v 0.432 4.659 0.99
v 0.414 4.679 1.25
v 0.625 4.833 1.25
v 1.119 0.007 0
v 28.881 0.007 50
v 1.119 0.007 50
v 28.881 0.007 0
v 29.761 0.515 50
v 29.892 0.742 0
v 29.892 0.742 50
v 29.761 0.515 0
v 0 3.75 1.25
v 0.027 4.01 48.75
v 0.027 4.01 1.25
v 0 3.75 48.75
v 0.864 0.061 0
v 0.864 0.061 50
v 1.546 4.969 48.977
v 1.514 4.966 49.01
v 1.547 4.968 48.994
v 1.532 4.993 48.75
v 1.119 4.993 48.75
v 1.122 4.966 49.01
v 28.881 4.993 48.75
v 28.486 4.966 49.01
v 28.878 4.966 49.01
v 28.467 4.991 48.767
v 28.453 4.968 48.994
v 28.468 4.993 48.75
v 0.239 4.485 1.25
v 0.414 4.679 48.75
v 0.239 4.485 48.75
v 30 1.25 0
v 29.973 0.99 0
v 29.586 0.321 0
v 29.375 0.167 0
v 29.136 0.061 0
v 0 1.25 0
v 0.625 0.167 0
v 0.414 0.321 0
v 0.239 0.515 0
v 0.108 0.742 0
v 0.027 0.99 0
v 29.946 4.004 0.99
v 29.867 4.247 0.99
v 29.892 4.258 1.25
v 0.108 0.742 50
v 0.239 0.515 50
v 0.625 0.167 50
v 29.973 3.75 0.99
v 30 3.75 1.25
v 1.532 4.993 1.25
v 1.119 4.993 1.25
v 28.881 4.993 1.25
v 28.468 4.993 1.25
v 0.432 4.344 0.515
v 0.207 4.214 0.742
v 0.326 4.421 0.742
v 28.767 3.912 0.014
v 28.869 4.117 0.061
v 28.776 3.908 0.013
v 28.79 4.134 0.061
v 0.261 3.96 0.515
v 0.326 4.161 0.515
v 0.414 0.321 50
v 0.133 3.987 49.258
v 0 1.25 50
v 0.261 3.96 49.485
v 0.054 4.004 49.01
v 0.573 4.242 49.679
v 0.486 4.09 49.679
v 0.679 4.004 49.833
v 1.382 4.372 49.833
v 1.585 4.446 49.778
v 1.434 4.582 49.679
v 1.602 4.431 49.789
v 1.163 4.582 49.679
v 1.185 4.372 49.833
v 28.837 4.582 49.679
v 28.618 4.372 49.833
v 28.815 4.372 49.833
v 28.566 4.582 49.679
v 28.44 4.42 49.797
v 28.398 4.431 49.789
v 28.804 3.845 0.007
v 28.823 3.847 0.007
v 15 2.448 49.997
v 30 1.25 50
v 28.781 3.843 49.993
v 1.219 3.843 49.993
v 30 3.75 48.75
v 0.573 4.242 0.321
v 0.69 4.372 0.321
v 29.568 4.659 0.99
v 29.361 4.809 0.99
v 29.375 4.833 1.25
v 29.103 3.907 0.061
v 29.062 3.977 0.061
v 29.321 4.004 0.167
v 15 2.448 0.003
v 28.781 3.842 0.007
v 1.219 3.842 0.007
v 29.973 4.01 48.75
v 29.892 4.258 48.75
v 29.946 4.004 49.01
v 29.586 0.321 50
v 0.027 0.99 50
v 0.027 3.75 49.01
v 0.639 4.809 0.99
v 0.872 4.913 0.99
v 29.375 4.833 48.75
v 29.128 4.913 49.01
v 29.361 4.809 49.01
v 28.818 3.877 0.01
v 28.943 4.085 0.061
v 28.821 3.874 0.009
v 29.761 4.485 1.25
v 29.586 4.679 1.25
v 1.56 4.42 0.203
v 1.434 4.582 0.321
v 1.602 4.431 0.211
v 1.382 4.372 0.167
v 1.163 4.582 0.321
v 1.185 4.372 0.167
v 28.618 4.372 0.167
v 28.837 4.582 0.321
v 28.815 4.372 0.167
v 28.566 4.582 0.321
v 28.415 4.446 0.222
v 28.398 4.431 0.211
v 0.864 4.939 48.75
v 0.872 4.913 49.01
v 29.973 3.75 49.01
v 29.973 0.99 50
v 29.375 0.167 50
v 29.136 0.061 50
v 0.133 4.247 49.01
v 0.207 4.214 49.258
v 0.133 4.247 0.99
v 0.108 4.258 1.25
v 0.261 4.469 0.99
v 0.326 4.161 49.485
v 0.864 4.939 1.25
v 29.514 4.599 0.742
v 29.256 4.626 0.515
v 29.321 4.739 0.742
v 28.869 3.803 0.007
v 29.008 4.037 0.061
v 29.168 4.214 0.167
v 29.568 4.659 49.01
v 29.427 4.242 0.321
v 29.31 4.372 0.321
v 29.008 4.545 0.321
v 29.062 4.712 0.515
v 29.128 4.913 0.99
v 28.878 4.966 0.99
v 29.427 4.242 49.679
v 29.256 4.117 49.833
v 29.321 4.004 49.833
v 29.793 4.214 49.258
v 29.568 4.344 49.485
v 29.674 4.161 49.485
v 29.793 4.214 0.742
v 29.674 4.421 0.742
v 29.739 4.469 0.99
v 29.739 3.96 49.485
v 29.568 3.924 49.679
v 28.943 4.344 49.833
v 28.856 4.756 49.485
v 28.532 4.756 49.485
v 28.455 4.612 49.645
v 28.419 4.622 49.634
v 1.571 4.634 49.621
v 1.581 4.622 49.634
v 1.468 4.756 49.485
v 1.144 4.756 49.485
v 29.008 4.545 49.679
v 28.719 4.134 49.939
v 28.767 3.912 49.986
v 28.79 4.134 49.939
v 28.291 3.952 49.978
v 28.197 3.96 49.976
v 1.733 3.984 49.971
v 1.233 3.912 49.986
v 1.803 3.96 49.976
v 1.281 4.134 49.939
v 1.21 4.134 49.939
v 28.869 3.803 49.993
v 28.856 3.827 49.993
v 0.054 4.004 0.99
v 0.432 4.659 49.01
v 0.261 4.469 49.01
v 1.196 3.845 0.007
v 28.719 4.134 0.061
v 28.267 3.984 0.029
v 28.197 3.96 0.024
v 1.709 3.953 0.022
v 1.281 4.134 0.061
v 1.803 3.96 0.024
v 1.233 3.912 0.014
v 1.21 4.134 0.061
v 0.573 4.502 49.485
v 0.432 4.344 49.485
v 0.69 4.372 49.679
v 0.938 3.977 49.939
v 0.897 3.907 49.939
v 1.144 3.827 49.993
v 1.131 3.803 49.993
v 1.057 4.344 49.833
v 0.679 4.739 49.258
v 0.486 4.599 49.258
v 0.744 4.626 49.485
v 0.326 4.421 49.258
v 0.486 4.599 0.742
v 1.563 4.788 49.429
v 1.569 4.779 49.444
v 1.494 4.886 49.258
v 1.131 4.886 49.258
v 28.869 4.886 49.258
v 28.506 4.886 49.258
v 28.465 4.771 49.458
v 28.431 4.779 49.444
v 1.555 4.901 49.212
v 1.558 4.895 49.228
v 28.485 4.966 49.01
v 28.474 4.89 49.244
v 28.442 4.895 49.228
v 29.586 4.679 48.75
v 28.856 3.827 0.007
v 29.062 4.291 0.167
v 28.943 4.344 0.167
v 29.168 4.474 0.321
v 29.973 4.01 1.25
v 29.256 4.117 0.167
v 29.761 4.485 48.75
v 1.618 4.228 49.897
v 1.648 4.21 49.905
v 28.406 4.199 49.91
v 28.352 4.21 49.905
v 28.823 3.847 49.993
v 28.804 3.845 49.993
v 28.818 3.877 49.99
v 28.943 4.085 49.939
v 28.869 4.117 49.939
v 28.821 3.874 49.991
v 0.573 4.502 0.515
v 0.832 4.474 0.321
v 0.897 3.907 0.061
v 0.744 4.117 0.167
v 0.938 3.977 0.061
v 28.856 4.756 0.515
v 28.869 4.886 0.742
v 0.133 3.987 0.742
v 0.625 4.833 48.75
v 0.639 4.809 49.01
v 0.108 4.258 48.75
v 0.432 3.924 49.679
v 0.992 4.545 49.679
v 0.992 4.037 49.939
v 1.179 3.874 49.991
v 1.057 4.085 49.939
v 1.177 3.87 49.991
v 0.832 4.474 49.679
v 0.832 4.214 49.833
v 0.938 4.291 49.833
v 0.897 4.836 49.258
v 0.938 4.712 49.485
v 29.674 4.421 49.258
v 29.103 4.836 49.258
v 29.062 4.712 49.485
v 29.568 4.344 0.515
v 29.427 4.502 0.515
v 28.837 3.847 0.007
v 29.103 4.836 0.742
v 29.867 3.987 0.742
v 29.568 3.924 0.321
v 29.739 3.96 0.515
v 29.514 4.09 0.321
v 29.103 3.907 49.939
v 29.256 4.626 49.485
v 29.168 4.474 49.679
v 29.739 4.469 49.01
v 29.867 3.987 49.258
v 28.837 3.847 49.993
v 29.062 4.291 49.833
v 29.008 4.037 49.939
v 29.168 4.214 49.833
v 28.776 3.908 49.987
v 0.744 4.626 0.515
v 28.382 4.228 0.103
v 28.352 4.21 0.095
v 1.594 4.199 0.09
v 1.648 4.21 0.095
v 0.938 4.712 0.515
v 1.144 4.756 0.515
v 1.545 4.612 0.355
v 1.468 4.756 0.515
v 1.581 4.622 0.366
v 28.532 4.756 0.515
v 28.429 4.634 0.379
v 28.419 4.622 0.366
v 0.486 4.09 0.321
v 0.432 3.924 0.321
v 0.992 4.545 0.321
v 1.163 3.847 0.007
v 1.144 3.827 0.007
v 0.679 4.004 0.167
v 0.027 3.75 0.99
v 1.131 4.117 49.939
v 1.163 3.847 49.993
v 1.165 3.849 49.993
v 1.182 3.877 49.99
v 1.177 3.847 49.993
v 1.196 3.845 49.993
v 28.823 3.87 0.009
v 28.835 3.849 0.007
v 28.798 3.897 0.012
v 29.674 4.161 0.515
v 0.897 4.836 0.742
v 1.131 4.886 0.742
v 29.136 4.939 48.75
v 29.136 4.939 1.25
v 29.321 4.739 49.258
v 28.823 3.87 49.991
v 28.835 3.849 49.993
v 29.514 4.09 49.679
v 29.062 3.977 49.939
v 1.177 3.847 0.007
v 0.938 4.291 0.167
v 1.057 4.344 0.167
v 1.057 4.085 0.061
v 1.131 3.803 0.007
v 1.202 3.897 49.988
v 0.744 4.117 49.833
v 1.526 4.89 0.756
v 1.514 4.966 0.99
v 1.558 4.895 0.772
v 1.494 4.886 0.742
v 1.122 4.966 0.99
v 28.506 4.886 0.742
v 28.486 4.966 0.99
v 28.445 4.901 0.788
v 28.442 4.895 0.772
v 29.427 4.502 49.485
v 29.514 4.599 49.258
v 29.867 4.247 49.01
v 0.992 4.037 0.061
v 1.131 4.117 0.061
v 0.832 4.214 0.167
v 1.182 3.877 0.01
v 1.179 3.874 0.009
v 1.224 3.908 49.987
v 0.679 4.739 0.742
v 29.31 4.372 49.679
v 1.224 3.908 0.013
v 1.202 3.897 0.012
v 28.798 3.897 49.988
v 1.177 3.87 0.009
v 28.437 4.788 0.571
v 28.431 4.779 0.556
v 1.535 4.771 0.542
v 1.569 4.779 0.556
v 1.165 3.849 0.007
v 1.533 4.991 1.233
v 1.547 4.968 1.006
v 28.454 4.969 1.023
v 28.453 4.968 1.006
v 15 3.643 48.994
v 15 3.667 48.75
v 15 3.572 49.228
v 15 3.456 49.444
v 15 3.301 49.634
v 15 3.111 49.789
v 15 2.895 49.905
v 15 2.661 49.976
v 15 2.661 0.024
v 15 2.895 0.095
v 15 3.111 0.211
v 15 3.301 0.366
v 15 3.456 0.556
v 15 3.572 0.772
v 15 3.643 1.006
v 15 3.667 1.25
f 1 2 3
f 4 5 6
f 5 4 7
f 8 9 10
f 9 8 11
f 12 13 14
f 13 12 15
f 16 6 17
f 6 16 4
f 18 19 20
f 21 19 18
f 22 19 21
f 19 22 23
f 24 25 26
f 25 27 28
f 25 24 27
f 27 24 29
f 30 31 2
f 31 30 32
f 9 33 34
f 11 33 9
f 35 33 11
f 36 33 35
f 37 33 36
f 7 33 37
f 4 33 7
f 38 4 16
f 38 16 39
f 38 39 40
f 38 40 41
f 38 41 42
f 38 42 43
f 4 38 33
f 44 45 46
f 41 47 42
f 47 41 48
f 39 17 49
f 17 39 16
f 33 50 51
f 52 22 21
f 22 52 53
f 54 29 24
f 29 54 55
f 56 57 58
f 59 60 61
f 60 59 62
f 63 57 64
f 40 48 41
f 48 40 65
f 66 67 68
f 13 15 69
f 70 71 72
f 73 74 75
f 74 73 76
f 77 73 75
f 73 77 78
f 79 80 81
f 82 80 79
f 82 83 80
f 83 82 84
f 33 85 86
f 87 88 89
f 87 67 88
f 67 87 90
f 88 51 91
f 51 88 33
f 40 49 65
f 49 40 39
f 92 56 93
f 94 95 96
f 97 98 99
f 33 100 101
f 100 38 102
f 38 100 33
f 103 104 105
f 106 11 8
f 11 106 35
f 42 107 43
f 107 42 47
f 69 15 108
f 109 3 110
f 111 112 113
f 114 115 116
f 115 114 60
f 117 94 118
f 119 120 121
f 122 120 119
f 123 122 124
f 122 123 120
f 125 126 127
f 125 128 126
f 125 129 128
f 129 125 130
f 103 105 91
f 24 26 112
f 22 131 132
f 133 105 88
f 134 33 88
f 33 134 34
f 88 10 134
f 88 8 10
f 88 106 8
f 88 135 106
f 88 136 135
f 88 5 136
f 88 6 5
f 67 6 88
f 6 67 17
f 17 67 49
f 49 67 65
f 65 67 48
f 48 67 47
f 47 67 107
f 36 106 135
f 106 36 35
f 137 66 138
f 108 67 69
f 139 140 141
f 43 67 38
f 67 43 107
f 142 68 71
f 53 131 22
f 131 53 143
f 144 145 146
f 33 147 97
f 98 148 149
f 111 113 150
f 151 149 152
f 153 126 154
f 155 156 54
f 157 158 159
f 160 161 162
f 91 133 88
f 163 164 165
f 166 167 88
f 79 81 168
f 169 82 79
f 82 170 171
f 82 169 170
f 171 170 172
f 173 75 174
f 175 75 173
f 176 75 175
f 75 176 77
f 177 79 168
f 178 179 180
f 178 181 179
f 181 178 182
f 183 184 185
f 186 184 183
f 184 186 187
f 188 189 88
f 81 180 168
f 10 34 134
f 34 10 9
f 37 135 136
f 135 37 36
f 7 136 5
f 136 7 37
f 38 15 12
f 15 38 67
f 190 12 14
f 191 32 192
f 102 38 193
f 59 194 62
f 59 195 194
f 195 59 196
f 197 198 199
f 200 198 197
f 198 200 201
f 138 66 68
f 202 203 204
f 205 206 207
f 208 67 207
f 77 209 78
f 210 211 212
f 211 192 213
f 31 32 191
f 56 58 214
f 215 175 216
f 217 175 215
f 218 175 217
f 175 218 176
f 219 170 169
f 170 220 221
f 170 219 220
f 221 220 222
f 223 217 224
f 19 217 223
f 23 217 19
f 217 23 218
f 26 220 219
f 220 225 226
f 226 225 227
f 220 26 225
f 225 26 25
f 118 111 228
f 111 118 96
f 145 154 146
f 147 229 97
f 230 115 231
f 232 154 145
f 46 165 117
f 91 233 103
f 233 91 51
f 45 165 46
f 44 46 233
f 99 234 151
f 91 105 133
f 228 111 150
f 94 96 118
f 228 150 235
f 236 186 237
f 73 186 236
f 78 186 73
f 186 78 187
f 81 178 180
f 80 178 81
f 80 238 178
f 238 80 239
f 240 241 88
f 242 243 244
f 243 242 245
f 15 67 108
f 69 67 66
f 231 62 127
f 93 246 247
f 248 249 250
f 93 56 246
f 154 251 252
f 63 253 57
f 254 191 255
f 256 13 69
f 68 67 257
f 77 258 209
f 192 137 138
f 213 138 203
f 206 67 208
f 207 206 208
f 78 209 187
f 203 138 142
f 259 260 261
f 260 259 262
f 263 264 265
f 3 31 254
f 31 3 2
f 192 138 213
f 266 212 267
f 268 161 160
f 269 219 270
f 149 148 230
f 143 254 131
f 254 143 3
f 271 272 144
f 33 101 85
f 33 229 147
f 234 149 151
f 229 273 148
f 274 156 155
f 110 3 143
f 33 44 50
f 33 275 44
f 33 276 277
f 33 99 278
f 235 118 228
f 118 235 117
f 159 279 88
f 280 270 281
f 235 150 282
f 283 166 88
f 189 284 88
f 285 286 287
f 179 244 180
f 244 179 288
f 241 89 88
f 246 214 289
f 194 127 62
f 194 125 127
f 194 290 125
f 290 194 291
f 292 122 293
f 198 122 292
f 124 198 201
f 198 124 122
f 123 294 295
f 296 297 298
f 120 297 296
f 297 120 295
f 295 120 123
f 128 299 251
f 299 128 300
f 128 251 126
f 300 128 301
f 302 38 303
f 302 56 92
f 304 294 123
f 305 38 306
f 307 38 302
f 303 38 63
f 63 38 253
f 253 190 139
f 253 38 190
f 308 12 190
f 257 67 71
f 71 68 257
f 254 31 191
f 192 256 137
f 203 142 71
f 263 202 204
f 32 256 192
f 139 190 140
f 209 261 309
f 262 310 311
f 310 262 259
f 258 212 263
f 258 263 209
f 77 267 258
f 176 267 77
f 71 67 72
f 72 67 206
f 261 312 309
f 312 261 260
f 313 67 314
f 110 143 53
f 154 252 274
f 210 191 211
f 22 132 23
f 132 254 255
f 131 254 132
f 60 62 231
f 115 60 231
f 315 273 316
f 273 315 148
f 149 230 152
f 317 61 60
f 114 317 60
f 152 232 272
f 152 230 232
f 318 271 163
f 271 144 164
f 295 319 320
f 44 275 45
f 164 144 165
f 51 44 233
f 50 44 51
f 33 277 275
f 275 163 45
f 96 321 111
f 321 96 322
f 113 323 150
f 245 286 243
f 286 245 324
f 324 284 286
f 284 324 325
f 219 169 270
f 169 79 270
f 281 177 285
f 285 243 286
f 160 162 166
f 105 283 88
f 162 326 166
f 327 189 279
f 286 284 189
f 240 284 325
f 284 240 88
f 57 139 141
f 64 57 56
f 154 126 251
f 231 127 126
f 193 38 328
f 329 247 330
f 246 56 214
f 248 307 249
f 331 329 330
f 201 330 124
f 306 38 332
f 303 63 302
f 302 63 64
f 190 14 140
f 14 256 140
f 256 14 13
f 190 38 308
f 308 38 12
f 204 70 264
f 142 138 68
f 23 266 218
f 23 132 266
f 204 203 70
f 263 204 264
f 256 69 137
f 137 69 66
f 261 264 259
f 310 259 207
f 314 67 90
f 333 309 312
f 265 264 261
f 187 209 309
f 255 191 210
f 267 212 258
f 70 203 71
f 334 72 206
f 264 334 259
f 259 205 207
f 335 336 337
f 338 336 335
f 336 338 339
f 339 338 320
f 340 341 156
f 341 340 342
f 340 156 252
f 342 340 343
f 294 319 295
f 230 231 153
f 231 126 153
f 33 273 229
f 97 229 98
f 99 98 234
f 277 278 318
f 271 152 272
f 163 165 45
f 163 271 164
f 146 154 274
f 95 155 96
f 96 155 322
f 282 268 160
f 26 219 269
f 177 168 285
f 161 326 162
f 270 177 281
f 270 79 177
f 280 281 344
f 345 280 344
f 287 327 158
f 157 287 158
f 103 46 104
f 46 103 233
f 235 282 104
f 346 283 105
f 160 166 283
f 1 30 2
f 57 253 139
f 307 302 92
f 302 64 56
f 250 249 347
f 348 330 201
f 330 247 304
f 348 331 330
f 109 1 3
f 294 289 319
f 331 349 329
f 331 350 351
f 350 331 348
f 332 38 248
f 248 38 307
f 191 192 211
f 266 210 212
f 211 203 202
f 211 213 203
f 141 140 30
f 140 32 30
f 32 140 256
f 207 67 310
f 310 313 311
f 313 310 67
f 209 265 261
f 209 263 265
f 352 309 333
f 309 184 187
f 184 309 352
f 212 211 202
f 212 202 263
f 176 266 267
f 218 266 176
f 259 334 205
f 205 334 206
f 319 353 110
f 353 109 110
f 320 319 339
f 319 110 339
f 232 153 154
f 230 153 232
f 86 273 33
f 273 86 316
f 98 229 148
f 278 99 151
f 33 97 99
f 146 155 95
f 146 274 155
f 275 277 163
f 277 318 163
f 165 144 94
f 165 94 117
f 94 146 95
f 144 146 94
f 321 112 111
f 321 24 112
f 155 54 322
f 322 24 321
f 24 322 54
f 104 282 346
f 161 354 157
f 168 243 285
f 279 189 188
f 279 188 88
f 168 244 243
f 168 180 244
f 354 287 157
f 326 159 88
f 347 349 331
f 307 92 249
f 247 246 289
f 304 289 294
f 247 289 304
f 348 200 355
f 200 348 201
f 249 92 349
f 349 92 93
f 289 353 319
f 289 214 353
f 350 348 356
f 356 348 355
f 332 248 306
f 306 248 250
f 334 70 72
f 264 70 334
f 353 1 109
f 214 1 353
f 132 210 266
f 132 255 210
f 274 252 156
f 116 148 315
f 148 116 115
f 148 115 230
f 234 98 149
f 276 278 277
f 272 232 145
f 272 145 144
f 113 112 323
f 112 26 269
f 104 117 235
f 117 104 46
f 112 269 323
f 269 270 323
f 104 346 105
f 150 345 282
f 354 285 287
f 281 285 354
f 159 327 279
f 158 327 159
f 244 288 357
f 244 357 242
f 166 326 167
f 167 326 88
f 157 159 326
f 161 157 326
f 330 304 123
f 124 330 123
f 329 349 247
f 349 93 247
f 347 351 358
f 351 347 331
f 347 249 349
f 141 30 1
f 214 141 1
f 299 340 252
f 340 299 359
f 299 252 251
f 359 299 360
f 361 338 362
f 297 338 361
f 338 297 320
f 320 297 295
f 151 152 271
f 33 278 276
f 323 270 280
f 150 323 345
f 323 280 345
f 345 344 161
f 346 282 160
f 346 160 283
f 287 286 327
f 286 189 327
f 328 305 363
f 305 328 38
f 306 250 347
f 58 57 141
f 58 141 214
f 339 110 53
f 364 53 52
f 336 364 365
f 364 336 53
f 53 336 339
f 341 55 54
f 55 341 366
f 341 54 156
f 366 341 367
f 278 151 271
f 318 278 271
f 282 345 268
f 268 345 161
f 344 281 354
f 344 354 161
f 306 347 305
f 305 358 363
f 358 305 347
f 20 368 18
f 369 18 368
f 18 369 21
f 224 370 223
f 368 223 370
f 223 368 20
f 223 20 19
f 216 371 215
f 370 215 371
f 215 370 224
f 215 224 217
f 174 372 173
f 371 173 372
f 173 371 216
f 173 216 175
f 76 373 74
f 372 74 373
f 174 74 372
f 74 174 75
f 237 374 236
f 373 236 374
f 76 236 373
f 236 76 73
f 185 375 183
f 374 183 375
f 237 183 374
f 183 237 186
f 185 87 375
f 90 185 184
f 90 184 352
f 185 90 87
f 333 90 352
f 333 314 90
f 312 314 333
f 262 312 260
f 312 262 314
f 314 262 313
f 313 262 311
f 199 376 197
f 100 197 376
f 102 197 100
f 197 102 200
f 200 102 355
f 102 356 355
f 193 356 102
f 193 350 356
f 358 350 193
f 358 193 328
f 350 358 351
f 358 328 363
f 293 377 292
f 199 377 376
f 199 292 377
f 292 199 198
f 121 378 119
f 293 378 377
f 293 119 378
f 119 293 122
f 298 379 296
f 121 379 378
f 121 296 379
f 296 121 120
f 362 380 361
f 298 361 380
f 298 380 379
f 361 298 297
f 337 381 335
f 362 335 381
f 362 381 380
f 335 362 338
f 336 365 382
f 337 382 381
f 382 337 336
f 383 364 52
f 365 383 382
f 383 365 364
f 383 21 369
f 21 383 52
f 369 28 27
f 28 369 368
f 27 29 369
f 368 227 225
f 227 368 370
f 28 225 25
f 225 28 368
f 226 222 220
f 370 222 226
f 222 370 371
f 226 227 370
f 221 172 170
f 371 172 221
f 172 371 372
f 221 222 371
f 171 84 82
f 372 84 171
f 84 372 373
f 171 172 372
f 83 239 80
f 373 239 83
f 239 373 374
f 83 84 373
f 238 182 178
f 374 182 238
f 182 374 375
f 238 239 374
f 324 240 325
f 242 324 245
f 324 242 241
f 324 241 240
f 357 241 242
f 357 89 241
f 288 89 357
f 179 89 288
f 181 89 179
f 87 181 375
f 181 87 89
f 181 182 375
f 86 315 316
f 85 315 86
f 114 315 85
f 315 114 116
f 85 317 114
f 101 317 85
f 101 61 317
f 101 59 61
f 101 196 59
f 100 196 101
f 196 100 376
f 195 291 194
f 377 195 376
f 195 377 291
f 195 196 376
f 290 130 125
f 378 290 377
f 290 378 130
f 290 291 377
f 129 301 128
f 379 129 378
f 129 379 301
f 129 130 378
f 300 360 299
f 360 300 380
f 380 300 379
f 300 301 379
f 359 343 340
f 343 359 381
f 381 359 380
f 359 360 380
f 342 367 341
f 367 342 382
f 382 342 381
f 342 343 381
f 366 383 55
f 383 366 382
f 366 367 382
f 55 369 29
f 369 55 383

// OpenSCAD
// file: rounded_cube.scad
/**
 * Creates a cube with a given size which is rounded/smoothed
 * in 2 dimensions.
 */
module rounded_cube_2D(size, radius = undef, $fn = 30)
{
	x = size[0];
	y = size[1];
	z = size[2];
	assert(x != undef, "width undefined");
	assert(y != undef, "height undefined");
	assert(z != undef, "depth undefined");
	r = (radius == undef) ? min(x, y, z) / 4 : radius;
	assert((2 * r) <= min(x, y, z), "rounding radius is too large");

	linear_extrude(height = z)
	hull()
	{
		// place a circle with the given radius
		// in each of the 4 corners
		translate([r, r, 0])
			circle(r = r);
		translate([x - r, r, 0])
			circle(r = r);
		translate([r, y - r, 0])
			circle(r = r);
		translate([x - r, y - r, 0])
			circle(r = r);
	}
}

/**
 * Creates a cube with a given size which is rounded/smoothed
 * in 3 dimensions.
 */
module rounded_cube_3D(size, radius = undef, $fn = 30)
{
	x = size[0];
	y = size[1];
	z = size[2];
	assert(x != undef, "width undefined");
	assert(y != undef, "height undefined");
	assert(z != undef, "depth undefined");
	r = (radius == undef) ? min(x, y, z) / 4 : radius;
	assert((2 * r) <= min(x, y, z), "rounding radius is too large");

	hull()
	{
		// place a sphere with the given radius
		// in each of the 8 corners
		translate([r, r, r])
			sphere(r = r);
		translate([r, r, z - r])
			sphere(r = r);
		translate([r, y - r, r])
			sphere(r = r);
		translate([r, y - r, z - r])
			sphere(r = r);
		translate([x - r, r, r])
			sphere(r = r);
		translate([x - r, r, z - r])
			sphere(r = r);
		translate([x - r, y - r, r])
			sphere(r = r);
		translate([x - r, y - r, z - r])
			sphere(r = r);
	}
}

module round_part_2D(r)
{
	translate([0, 0, -r])
		difference()
		{
			cylinder(h = 2 * r, r = r);
			translate([-(5 * r), 0, -(1 * r)])
				cube([10 * r, 10 * r, 10 * r]);
		}
}

/**
 * Creates a cube with a given size which is rounded/smoothed
 * in 2.5 dimensions.
 */
module rounded_cube_2_5D(size, radius = undef, $fn = 30)
{
	x = size[0];
	y = size[1];
	z = size[2];
	assert(x != undef, "width undefined");
	assert(y != undef, "height undefined");
	assert(z != undef, "depth undefined");
	r = (radius == undef) ? min(x, y, z) / 4 : radius;
	assert((2 * r) <= min(x, y, z), "rounding radius is too large");

	hull()
	{
		// place a sphere with the given radius
		// in the 4 top corners,
		// and a circle in each of the 4 bottom corners
		translate([r, r, r])
			round_part_2D(r);
		translate([r, r, z - r])
			round_part_2D(r);
		translate([r, y - r, r])
			sphere(r = r);
		translate([r, y - r, z - r])
			sphere(r = r);
		translate([x - r, r, r])
			round_part_2D(r);
		translate([x - r, r, z - r])
			round_part_2D(r);
		translate([x - r, y - r, r])
			sphere(r = r);
		translate([x - r, y - r, z - r])
			sphere(r = r);
	}
}

/**
 * Creates a cube with a given size which is rounded/smoothed
 * in 2.25 dimensions.
 */
module rounded_cube_2_25D(size, radius = undef, $fn = 30)
{
	x = size[0];
	y = size[1];
	z = size[2];
	assert(x != undef, "width undefined");
	assert(y != undef, "height undefined");
	assert(z != undef, "depth undefined");
	r = (radius == undef) ? min(x, y, z) / 4 : radius;
	assert((2 * r) <= min(x, y, z), "rounding radius is too large");

	hull()
	{
		// place a sphere with the given radius
		// in the 4 top and 2 far bottom corners,
		// and a circle in each of the 2 bottom front corners
		translate([r, r, r])
			round_part_2D(r);
		translate([r, r, z - r])
			sphere(r = r);
		translate([r, y - r, r])
			sphere(r = r);
		translate([r, y - r, z - r])
			sphere(r = r);
		translate([x - r, r, r])
			round_part_2D(r);
		translate([x - r, r, z - r])
			sphere(r = r);
		translate([x - r, y - r, r])
			sphere(r = r);
		translate([x - r, y - r, z - r])
			sphere(r = r);
	}
}
// main file
use <rounded_cube.scad>;

//roundingRadius = 2.0;
//rr = roundingRadius;
//rr2 = rr * 2;
highRes = false;
//highRes = true;

// key size [width, height, depth]
keySize = [30.0, 5.0, 50.0];

//x = keySize[0];
//y = keySize[1];
//z = keySize[2];







/**
 * Constructs one side-wall of the form
 * that indents/creates a pit in the key.
 */
module keyPitSideWall(size, roundingRadius)
{
	x = size[0];
	y = size[1];
	z = size[2];
	rr = roundingRadius;
	rr2 = rr * 2;

	translate([-rr, -rr, 0])
		translate([x + 2 * y, 0, 0])
		square(rr2);
	circle(r = rr, center = true);
}

/**
 * Constructs a Stenoboard-style key.
 */
module key(size, roundingRadius = undef, pitDepth = undef, pitWidth = undef)
{
	x = size[0];
	y = size[1];
	z = size[2];
	//echo("roundingRadius: ", roundingRadius);
	rr = (roundingRadius == undef) ? (y / 4) : roundingRadius;
	//echo("rr: ", rr);
	rr2 = rr * 2;

	//pitDepth = y / 3;
	//pitRadius = 1.5 * x;
	pd = (pitDepth == undef) ? ((y - 1.0) / 3) : pitDepth;
	//pitDepth = (y - 1.0) / 3;
	pw = (pitWidth == undef) ? (x * 0.85) : pitWidth;
	//pitRadius = 1.2 * x;
	// how to calculate the desired pit angle:
	// (2 * w)^2 + (r - d)^2 = r^2
	// (2 * w)^2 + r^2 - 2*r*d + d^2 = r^2
	// 4*w^2 - 2*r*d + d^2 = 0
	// 4*w^2 + d^2 = 2*r*d
	// (4*w^2 + d^2) / (2*d) = r
	pitRadius = (4*pw*pw + pd*pd) / (2*pd);

	// distance of base key structure rectangle to the pit circle center
	keyPitCenterDist = pitRadius - pd;
	pitAngleAbstr = acos(keyPitCenterDist / pitRadius);
	pitAngleStart = 0 - pitAngleAbstr;
	pitAngleEnd   = 0 + pitAngleAbstr;
	//pitWidth = 2 * sqrt(pitRadius*pitRadius - keyPitCenterDist*keyPitCenterDist);

	//assert((1.0 + pd) < y, "finger pit is too deep");
	assert((1.1 * pd) < y, "finger pit is too deep");
	assert((1.1 * pw) < x, "finger pit is too wide"); // obsolete test, as this one is generated

	intersection()
	{
		// the (smooth) base structure of the key
		rounded_cube_2_5D(size, rr);

		// the (smooth) pit for the finger
		{
			pitAngleRange = pitAngleEnd - pitAngleStart;
			//pitOverlapAngle = 2 * pitAngleRange;
			pitOverlapAngle = 180;
			$fn = (360 / pitOverlapAngle) * (highRes ? 80 : 16);
			translate([0, -rr, rr]) 
				translate([x / 2, pitRadius - pd + y, 0])
				rotate(270 - (pitOverlapAngle / 2))
				rotate_extrude(angle = pitOverlapAngle, convexity = 10)
				translate([pitRadius, 0, 0])
				hull()
				{
					keyPitSideWall(size, rr);
					translate([0, z - rr2, 0])
						keyPitSideWall(size, rr);
				}
		}
	}
}


key(keySize);
